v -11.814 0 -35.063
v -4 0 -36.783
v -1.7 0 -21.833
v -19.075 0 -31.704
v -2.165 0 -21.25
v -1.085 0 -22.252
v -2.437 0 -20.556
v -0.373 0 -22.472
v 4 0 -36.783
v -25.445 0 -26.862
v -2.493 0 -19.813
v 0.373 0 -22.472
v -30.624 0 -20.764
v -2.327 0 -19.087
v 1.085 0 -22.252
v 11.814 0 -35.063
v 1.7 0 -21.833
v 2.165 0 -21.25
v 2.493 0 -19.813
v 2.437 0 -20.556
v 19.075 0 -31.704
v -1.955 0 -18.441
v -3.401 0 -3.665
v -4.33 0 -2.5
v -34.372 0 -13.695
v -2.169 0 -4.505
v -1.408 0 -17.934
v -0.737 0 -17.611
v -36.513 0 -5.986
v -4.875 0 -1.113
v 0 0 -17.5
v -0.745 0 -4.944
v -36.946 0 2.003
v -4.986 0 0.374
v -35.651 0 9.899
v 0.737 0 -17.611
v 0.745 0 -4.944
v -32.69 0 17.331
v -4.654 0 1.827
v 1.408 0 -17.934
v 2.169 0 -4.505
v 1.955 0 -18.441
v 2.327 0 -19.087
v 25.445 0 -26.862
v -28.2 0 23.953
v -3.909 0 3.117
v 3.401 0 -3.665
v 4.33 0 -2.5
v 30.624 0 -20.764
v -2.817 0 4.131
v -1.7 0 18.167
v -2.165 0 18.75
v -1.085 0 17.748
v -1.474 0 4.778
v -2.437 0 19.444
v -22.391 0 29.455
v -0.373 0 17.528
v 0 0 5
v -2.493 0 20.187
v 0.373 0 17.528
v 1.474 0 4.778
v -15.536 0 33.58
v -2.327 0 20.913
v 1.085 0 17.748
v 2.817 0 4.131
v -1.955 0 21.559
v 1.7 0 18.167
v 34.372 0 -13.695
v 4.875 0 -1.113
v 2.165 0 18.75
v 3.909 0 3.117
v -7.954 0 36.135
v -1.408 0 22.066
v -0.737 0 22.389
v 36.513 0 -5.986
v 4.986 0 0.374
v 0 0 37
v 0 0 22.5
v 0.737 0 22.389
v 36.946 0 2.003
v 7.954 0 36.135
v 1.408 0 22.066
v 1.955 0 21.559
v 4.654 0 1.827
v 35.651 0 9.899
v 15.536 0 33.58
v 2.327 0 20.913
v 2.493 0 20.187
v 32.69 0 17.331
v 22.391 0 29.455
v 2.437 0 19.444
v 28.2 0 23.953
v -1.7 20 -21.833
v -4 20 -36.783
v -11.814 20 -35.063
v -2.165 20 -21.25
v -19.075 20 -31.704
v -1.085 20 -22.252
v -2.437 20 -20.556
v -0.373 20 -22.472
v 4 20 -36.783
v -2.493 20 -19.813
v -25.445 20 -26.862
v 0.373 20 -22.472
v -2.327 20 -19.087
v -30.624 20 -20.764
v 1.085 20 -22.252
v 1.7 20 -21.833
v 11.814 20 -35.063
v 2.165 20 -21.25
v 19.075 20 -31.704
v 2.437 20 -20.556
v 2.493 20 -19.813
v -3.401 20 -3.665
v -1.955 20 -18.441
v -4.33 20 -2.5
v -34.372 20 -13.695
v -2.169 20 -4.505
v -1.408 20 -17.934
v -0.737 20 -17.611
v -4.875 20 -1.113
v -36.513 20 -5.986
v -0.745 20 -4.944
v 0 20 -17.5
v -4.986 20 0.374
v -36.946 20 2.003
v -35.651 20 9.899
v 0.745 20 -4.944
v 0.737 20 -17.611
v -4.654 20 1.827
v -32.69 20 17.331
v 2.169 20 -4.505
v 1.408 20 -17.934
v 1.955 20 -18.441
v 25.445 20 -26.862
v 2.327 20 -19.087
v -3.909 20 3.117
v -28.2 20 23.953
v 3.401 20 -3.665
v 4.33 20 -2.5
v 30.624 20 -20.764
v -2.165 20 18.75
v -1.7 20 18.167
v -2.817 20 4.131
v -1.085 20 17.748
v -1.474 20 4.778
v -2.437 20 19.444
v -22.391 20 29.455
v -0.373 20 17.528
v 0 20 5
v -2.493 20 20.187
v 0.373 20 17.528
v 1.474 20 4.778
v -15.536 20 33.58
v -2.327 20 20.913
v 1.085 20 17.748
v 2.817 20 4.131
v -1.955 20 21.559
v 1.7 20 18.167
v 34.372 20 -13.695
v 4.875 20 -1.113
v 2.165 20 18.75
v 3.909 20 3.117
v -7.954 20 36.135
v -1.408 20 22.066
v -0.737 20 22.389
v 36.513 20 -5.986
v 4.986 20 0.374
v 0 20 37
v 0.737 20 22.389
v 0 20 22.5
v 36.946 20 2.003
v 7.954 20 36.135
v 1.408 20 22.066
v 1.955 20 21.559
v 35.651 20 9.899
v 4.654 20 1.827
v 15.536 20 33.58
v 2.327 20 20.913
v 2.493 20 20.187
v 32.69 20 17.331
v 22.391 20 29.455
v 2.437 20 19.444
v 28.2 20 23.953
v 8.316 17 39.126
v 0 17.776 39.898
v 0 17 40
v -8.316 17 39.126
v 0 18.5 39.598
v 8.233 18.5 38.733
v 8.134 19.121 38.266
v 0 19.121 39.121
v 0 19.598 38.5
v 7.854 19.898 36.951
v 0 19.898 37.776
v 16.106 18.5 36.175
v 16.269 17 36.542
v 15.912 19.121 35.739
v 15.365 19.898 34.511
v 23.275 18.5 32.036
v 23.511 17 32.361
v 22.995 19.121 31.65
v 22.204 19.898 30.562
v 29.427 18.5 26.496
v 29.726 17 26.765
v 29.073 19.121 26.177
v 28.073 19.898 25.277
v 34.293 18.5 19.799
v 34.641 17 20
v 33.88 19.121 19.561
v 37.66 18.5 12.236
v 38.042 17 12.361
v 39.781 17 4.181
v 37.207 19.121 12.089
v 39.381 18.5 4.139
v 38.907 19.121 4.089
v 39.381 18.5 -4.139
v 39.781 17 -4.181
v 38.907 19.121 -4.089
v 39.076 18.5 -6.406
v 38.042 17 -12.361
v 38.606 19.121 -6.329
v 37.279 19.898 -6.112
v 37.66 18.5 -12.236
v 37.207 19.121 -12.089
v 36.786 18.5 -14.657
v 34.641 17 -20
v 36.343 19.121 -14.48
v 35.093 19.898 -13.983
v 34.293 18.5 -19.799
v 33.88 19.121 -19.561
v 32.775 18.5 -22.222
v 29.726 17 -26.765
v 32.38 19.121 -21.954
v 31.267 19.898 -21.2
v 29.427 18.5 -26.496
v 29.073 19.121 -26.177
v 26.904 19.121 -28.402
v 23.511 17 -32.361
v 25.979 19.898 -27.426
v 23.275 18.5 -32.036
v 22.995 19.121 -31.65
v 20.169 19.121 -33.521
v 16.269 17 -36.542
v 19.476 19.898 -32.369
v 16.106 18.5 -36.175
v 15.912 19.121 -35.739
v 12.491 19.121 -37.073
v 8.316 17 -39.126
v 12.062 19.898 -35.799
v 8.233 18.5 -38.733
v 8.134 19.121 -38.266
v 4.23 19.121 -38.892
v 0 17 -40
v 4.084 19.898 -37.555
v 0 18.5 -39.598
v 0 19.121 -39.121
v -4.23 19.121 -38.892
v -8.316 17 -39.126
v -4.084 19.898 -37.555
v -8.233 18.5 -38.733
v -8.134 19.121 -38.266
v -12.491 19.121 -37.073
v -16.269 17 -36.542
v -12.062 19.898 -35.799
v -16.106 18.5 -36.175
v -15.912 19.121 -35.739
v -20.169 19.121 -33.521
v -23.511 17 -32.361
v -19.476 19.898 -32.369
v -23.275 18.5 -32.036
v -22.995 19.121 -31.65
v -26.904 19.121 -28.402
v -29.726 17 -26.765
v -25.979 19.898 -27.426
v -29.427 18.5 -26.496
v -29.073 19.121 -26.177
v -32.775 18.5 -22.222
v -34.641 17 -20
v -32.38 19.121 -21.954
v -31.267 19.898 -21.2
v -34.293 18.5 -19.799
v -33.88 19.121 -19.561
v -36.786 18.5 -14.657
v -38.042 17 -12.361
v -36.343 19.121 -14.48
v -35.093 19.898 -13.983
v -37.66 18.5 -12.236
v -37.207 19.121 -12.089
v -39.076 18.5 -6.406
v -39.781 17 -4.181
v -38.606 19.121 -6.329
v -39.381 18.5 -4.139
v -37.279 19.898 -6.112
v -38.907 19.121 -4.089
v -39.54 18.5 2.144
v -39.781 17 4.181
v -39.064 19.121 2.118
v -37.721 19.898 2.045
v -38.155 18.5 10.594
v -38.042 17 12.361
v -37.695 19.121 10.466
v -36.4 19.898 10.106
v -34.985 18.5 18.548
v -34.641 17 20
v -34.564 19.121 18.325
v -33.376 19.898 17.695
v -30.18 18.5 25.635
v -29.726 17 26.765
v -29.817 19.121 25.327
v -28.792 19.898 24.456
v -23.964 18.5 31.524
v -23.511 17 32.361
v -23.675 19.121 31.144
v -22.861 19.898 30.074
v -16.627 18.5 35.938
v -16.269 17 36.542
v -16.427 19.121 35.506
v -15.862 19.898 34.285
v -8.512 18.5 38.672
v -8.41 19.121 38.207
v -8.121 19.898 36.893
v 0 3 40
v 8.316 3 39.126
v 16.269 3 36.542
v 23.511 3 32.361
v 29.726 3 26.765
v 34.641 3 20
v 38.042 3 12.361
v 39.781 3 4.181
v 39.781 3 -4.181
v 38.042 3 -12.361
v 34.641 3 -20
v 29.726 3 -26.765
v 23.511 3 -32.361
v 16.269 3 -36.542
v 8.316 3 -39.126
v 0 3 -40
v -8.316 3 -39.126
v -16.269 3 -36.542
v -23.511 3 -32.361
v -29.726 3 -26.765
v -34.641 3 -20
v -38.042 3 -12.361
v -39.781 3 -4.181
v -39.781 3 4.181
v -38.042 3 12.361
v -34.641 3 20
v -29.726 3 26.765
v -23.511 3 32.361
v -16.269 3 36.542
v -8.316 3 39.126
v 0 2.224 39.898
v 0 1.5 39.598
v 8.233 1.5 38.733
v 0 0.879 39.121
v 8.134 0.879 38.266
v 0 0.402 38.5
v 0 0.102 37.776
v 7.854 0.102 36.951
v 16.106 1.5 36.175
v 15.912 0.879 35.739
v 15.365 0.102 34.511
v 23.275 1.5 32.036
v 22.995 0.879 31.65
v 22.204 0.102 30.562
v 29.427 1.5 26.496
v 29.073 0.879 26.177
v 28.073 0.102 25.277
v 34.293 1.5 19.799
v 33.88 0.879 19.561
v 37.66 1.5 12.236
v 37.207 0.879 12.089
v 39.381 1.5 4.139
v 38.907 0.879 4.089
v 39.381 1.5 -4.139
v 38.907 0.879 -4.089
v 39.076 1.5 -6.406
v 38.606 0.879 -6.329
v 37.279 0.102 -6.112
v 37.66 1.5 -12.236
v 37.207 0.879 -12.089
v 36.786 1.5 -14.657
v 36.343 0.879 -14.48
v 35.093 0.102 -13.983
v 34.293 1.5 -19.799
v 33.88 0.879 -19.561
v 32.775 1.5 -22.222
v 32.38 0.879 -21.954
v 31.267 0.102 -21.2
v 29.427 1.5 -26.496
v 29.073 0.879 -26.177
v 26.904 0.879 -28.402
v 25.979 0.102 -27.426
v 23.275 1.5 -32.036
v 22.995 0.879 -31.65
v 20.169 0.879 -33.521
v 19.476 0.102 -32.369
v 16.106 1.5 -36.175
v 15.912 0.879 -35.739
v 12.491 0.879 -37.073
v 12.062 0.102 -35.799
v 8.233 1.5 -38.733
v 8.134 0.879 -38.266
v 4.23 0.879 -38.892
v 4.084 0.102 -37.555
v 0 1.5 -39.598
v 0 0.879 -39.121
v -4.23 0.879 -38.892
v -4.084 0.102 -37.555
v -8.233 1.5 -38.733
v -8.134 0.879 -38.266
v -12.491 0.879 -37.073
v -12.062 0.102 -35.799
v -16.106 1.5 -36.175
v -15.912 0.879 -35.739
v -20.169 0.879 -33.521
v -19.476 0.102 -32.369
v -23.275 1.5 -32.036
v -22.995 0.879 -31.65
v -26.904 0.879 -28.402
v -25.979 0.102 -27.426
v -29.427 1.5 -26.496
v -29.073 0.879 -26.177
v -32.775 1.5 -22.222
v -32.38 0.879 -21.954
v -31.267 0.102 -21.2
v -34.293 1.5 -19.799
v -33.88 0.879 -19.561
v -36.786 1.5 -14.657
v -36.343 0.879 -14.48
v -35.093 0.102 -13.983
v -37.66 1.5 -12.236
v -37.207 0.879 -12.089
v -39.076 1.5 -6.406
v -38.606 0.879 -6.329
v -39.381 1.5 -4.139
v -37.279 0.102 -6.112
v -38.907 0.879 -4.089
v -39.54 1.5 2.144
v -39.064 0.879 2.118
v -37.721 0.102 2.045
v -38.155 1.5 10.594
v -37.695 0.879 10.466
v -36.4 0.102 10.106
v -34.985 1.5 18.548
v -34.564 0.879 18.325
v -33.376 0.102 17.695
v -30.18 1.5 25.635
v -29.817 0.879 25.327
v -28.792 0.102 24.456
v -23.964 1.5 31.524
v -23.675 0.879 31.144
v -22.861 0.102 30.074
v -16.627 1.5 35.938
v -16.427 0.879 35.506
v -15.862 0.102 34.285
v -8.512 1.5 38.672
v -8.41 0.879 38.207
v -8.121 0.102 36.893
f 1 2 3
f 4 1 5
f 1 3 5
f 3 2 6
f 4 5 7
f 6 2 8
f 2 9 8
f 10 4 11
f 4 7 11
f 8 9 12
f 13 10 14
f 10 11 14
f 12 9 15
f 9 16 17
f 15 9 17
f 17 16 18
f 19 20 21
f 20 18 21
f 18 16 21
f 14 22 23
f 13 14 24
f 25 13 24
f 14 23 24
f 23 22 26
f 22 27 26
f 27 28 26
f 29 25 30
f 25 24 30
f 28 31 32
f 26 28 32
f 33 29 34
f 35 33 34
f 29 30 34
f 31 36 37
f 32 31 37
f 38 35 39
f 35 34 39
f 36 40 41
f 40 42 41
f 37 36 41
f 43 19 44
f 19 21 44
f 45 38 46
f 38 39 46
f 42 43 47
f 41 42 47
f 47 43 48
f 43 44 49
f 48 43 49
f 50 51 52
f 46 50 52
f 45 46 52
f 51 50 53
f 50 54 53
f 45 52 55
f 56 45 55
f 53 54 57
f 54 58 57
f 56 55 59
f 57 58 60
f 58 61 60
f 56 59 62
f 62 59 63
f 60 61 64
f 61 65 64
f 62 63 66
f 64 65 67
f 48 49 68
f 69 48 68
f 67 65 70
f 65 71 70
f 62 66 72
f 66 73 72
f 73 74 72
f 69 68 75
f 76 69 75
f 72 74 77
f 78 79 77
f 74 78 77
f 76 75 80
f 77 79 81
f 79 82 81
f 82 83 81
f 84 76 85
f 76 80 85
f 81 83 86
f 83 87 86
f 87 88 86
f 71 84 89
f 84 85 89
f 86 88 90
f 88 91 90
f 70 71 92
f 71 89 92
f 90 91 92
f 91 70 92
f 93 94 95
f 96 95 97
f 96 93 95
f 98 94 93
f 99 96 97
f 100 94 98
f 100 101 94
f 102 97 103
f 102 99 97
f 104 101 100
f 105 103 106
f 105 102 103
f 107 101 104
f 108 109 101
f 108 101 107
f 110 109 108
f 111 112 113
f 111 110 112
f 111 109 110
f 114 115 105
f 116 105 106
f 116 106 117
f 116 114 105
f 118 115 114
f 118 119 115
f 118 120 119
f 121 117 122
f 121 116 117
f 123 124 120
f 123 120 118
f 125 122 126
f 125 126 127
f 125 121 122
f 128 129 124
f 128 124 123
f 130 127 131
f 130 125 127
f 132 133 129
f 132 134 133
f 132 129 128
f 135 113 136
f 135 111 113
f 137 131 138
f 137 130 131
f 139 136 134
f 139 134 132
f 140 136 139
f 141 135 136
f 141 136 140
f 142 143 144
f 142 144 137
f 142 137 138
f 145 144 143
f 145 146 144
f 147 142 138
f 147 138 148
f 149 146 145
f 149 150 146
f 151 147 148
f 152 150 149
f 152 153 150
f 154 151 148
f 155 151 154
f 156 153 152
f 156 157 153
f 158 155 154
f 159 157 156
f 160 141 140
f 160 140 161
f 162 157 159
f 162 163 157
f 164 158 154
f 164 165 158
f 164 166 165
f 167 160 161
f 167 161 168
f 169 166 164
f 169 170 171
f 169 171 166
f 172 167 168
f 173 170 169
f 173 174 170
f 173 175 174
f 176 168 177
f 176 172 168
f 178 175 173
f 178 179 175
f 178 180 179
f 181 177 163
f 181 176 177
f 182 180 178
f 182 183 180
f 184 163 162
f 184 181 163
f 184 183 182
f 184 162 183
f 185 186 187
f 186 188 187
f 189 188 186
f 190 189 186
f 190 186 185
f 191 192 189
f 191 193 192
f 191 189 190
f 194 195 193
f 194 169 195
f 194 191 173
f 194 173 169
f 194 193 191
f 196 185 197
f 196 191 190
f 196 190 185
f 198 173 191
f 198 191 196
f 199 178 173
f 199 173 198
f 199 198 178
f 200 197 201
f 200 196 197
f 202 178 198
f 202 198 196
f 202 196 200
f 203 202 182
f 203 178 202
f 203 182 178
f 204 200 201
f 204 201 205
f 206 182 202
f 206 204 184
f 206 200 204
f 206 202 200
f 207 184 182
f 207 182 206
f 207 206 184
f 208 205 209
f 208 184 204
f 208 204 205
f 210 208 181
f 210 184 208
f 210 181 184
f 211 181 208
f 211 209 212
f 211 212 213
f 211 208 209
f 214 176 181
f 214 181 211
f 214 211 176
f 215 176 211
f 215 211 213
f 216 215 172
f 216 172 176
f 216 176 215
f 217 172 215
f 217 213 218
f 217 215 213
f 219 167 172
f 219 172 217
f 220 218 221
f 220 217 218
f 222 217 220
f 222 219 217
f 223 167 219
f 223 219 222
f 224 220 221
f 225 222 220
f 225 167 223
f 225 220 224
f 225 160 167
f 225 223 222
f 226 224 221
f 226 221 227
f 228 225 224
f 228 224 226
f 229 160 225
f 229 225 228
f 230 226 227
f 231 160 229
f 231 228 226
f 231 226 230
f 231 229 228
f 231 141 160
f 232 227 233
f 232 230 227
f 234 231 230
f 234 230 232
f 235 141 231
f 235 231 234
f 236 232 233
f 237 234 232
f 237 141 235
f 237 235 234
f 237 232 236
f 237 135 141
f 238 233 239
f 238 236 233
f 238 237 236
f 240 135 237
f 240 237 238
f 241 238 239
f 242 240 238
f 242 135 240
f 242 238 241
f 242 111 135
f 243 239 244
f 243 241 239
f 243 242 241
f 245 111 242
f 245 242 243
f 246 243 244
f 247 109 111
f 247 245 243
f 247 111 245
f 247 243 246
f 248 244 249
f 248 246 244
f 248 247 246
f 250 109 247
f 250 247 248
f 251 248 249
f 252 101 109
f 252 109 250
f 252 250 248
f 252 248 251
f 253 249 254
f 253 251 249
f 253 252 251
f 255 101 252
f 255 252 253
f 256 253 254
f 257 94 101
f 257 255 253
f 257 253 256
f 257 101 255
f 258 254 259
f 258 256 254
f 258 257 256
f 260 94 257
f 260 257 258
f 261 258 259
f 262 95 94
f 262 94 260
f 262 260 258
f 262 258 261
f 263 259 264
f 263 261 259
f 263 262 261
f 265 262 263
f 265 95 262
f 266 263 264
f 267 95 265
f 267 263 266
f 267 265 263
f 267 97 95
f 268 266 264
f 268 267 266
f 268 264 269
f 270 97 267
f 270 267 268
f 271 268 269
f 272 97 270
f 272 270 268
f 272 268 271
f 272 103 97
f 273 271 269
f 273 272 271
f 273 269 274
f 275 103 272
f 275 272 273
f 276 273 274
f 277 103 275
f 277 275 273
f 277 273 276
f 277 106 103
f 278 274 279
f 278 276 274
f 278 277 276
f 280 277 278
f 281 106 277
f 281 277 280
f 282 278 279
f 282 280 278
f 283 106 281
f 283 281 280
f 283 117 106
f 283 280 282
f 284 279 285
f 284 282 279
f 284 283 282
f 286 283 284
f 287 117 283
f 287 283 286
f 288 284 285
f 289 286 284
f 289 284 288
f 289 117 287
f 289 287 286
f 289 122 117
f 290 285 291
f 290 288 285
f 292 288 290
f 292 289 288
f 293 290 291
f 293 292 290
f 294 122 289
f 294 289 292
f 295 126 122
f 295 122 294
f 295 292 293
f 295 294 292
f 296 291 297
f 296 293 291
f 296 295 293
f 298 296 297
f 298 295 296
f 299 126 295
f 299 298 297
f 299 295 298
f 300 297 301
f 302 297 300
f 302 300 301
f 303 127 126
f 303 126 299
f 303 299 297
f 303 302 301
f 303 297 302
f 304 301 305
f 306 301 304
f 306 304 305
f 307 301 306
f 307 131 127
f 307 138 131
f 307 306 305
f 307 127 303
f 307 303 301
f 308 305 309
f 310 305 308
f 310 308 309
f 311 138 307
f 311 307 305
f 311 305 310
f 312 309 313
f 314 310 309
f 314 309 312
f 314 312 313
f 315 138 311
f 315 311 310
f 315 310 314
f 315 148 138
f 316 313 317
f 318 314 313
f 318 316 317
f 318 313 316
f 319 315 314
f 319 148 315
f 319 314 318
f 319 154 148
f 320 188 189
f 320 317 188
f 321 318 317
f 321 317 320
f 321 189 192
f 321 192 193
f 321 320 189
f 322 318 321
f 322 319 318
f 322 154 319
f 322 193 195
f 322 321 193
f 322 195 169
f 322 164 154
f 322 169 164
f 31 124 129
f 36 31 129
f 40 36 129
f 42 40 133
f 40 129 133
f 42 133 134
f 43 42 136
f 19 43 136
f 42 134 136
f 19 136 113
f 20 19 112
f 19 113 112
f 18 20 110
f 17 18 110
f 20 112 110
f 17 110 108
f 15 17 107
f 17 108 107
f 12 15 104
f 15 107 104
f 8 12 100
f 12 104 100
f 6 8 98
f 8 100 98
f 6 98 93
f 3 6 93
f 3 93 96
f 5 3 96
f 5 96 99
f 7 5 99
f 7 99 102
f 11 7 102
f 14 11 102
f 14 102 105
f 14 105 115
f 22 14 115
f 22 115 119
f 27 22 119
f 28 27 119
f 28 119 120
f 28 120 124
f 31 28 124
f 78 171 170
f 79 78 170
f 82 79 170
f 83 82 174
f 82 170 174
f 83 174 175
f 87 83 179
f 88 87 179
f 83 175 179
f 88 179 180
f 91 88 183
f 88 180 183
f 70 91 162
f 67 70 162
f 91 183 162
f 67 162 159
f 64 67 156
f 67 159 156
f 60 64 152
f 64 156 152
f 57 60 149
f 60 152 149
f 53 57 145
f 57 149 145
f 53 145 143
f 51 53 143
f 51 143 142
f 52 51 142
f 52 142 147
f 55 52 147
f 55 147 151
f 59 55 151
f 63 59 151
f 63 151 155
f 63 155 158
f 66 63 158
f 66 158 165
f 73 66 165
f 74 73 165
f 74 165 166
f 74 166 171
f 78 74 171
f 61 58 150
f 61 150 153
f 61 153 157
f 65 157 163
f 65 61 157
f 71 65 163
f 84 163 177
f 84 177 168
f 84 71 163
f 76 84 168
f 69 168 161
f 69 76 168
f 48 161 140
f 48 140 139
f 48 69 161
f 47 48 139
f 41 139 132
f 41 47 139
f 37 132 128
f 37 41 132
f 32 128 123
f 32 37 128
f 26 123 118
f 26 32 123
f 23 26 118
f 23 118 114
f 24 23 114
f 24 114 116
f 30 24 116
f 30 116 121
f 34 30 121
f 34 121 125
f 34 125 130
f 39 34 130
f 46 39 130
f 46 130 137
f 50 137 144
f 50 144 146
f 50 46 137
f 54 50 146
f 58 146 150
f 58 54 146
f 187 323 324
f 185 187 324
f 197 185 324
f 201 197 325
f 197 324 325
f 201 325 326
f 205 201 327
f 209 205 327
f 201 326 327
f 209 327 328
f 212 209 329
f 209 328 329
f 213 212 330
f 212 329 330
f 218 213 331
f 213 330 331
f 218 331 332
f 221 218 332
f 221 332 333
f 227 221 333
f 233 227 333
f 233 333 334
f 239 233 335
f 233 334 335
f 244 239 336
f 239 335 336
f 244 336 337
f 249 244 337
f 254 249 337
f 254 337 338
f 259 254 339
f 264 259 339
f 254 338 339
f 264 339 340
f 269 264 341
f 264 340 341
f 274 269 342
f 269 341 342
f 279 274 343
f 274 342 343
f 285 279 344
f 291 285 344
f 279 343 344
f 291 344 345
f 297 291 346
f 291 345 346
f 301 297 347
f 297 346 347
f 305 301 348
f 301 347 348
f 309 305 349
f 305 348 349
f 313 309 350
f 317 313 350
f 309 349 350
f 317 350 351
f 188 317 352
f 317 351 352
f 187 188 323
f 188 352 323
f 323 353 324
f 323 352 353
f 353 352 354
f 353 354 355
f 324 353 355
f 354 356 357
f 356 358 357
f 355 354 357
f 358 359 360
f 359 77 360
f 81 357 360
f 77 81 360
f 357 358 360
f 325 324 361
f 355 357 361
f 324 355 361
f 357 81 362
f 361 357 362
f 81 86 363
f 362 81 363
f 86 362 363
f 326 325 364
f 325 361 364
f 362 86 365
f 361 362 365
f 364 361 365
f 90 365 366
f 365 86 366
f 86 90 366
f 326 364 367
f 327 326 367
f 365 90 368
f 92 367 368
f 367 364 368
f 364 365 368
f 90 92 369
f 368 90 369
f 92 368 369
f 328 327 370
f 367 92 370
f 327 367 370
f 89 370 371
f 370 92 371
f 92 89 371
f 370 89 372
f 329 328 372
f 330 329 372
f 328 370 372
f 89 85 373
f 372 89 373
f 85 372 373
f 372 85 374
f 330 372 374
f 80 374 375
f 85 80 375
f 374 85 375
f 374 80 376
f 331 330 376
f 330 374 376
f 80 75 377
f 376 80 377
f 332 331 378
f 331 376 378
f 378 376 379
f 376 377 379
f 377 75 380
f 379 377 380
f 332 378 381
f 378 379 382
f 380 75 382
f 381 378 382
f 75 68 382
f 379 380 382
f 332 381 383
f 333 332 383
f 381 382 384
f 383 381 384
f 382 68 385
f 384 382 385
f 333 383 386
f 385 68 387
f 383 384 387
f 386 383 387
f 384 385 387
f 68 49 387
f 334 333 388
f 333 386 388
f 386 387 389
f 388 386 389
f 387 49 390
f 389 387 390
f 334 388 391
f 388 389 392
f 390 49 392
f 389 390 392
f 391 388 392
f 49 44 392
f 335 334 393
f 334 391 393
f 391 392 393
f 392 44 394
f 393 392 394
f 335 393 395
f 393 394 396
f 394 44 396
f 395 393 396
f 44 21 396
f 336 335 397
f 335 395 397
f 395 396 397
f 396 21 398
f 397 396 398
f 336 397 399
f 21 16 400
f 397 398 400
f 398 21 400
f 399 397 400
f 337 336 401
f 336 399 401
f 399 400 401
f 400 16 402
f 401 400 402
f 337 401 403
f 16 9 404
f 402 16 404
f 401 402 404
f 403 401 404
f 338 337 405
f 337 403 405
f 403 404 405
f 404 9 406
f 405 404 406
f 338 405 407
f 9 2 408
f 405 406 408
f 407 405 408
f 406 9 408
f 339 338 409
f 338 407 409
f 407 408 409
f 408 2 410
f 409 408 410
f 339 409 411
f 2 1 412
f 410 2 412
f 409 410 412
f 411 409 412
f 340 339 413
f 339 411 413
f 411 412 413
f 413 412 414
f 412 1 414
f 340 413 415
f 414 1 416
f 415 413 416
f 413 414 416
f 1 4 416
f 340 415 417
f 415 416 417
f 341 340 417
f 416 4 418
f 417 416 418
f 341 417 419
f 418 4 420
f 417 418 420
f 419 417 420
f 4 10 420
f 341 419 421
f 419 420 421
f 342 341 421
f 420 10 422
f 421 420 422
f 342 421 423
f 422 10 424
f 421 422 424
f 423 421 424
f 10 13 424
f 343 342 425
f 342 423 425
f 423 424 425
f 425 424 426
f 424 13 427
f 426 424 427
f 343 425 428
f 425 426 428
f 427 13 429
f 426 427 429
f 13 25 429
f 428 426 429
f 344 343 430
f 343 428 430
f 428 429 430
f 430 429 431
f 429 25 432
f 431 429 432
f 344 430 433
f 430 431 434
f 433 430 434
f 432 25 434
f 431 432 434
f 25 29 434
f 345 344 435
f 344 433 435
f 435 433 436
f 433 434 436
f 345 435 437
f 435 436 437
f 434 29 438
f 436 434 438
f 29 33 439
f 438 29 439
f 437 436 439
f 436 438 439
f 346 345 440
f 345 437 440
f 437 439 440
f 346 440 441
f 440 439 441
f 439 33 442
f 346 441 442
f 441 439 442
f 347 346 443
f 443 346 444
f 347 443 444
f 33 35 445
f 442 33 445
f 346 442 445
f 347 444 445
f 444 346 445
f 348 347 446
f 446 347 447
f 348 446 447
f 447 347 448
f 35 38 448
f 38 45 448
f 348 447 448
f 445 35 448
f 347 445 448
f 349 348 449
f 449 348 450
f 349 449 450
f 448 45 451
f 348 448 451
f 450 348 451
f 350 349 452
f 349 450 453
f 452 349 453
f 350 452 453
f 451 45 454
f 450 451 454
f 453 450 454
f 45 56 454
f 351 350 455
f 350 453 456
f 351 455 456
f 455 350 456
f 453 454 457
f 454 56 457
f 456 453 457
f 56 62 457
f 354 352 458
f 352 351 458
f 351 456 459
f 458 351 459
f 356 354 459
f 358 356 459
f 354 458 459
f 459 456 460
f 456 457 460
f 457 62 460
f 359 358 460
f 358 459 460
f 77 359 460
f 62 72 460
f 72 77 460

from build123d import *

# Parameters (mm, degrees)
SKETCH_1_R          = 40
SKETCH_1_R_2        = 5
EXTRUDE_1_DEPTH     = 20
FILLET_1_R          = 3
SKETCH_2_R          = 2.5
CUT_EXTRUDE_1_DEPTH = 61


with BuildPart() as part:
    # 草圖1 → 填料-伸長1 (new body)
    with BuildSketch(Plane(origin=(0, 0, 0), x_dir=(1, 0, 0), z_dir=(0, 1, 0))):
        with Locations(Location((0, 0, 0), (0, 0, 270))):
            Circle(SKETCH_1_R)
        with Locations(Location((0, 0, 0), (0, 0, 270))):
            Circle(SKETCH_1_R_2, mode=Mode.SUBTRACT)
    extrude(amount=EXTRUDE_1_DEPTH)

    # 圓角1
    fillet_1_edges = [part.edges().sort_by_distance(p)[0] for p in [
        (0, 0, -40),
        (0, 20, -40),
    ]]
    fillet(fillet_1_edges, radius=FILLET_1_R)

    # 草圖2 → 除料-伸長1 (cut, through all)
    with BuildSketch(Plane(origin=(0, 20, 0), x_dir=(1, 0, 0), z_dir=(0, 1, 0))):
        with Locations(Location((0, 20, 0), (0, 0, 270))):
            Circle(SKETCH_2_R)
        with Locations(Location((0, -20, 0), (0, 0, 270))):
            Circle(SKETCH_2_R)
    extrude(amount=-CUT_EXTRUDE_1_DEPTH, mode=Mode.SUBTRACT)


solid = part.part
